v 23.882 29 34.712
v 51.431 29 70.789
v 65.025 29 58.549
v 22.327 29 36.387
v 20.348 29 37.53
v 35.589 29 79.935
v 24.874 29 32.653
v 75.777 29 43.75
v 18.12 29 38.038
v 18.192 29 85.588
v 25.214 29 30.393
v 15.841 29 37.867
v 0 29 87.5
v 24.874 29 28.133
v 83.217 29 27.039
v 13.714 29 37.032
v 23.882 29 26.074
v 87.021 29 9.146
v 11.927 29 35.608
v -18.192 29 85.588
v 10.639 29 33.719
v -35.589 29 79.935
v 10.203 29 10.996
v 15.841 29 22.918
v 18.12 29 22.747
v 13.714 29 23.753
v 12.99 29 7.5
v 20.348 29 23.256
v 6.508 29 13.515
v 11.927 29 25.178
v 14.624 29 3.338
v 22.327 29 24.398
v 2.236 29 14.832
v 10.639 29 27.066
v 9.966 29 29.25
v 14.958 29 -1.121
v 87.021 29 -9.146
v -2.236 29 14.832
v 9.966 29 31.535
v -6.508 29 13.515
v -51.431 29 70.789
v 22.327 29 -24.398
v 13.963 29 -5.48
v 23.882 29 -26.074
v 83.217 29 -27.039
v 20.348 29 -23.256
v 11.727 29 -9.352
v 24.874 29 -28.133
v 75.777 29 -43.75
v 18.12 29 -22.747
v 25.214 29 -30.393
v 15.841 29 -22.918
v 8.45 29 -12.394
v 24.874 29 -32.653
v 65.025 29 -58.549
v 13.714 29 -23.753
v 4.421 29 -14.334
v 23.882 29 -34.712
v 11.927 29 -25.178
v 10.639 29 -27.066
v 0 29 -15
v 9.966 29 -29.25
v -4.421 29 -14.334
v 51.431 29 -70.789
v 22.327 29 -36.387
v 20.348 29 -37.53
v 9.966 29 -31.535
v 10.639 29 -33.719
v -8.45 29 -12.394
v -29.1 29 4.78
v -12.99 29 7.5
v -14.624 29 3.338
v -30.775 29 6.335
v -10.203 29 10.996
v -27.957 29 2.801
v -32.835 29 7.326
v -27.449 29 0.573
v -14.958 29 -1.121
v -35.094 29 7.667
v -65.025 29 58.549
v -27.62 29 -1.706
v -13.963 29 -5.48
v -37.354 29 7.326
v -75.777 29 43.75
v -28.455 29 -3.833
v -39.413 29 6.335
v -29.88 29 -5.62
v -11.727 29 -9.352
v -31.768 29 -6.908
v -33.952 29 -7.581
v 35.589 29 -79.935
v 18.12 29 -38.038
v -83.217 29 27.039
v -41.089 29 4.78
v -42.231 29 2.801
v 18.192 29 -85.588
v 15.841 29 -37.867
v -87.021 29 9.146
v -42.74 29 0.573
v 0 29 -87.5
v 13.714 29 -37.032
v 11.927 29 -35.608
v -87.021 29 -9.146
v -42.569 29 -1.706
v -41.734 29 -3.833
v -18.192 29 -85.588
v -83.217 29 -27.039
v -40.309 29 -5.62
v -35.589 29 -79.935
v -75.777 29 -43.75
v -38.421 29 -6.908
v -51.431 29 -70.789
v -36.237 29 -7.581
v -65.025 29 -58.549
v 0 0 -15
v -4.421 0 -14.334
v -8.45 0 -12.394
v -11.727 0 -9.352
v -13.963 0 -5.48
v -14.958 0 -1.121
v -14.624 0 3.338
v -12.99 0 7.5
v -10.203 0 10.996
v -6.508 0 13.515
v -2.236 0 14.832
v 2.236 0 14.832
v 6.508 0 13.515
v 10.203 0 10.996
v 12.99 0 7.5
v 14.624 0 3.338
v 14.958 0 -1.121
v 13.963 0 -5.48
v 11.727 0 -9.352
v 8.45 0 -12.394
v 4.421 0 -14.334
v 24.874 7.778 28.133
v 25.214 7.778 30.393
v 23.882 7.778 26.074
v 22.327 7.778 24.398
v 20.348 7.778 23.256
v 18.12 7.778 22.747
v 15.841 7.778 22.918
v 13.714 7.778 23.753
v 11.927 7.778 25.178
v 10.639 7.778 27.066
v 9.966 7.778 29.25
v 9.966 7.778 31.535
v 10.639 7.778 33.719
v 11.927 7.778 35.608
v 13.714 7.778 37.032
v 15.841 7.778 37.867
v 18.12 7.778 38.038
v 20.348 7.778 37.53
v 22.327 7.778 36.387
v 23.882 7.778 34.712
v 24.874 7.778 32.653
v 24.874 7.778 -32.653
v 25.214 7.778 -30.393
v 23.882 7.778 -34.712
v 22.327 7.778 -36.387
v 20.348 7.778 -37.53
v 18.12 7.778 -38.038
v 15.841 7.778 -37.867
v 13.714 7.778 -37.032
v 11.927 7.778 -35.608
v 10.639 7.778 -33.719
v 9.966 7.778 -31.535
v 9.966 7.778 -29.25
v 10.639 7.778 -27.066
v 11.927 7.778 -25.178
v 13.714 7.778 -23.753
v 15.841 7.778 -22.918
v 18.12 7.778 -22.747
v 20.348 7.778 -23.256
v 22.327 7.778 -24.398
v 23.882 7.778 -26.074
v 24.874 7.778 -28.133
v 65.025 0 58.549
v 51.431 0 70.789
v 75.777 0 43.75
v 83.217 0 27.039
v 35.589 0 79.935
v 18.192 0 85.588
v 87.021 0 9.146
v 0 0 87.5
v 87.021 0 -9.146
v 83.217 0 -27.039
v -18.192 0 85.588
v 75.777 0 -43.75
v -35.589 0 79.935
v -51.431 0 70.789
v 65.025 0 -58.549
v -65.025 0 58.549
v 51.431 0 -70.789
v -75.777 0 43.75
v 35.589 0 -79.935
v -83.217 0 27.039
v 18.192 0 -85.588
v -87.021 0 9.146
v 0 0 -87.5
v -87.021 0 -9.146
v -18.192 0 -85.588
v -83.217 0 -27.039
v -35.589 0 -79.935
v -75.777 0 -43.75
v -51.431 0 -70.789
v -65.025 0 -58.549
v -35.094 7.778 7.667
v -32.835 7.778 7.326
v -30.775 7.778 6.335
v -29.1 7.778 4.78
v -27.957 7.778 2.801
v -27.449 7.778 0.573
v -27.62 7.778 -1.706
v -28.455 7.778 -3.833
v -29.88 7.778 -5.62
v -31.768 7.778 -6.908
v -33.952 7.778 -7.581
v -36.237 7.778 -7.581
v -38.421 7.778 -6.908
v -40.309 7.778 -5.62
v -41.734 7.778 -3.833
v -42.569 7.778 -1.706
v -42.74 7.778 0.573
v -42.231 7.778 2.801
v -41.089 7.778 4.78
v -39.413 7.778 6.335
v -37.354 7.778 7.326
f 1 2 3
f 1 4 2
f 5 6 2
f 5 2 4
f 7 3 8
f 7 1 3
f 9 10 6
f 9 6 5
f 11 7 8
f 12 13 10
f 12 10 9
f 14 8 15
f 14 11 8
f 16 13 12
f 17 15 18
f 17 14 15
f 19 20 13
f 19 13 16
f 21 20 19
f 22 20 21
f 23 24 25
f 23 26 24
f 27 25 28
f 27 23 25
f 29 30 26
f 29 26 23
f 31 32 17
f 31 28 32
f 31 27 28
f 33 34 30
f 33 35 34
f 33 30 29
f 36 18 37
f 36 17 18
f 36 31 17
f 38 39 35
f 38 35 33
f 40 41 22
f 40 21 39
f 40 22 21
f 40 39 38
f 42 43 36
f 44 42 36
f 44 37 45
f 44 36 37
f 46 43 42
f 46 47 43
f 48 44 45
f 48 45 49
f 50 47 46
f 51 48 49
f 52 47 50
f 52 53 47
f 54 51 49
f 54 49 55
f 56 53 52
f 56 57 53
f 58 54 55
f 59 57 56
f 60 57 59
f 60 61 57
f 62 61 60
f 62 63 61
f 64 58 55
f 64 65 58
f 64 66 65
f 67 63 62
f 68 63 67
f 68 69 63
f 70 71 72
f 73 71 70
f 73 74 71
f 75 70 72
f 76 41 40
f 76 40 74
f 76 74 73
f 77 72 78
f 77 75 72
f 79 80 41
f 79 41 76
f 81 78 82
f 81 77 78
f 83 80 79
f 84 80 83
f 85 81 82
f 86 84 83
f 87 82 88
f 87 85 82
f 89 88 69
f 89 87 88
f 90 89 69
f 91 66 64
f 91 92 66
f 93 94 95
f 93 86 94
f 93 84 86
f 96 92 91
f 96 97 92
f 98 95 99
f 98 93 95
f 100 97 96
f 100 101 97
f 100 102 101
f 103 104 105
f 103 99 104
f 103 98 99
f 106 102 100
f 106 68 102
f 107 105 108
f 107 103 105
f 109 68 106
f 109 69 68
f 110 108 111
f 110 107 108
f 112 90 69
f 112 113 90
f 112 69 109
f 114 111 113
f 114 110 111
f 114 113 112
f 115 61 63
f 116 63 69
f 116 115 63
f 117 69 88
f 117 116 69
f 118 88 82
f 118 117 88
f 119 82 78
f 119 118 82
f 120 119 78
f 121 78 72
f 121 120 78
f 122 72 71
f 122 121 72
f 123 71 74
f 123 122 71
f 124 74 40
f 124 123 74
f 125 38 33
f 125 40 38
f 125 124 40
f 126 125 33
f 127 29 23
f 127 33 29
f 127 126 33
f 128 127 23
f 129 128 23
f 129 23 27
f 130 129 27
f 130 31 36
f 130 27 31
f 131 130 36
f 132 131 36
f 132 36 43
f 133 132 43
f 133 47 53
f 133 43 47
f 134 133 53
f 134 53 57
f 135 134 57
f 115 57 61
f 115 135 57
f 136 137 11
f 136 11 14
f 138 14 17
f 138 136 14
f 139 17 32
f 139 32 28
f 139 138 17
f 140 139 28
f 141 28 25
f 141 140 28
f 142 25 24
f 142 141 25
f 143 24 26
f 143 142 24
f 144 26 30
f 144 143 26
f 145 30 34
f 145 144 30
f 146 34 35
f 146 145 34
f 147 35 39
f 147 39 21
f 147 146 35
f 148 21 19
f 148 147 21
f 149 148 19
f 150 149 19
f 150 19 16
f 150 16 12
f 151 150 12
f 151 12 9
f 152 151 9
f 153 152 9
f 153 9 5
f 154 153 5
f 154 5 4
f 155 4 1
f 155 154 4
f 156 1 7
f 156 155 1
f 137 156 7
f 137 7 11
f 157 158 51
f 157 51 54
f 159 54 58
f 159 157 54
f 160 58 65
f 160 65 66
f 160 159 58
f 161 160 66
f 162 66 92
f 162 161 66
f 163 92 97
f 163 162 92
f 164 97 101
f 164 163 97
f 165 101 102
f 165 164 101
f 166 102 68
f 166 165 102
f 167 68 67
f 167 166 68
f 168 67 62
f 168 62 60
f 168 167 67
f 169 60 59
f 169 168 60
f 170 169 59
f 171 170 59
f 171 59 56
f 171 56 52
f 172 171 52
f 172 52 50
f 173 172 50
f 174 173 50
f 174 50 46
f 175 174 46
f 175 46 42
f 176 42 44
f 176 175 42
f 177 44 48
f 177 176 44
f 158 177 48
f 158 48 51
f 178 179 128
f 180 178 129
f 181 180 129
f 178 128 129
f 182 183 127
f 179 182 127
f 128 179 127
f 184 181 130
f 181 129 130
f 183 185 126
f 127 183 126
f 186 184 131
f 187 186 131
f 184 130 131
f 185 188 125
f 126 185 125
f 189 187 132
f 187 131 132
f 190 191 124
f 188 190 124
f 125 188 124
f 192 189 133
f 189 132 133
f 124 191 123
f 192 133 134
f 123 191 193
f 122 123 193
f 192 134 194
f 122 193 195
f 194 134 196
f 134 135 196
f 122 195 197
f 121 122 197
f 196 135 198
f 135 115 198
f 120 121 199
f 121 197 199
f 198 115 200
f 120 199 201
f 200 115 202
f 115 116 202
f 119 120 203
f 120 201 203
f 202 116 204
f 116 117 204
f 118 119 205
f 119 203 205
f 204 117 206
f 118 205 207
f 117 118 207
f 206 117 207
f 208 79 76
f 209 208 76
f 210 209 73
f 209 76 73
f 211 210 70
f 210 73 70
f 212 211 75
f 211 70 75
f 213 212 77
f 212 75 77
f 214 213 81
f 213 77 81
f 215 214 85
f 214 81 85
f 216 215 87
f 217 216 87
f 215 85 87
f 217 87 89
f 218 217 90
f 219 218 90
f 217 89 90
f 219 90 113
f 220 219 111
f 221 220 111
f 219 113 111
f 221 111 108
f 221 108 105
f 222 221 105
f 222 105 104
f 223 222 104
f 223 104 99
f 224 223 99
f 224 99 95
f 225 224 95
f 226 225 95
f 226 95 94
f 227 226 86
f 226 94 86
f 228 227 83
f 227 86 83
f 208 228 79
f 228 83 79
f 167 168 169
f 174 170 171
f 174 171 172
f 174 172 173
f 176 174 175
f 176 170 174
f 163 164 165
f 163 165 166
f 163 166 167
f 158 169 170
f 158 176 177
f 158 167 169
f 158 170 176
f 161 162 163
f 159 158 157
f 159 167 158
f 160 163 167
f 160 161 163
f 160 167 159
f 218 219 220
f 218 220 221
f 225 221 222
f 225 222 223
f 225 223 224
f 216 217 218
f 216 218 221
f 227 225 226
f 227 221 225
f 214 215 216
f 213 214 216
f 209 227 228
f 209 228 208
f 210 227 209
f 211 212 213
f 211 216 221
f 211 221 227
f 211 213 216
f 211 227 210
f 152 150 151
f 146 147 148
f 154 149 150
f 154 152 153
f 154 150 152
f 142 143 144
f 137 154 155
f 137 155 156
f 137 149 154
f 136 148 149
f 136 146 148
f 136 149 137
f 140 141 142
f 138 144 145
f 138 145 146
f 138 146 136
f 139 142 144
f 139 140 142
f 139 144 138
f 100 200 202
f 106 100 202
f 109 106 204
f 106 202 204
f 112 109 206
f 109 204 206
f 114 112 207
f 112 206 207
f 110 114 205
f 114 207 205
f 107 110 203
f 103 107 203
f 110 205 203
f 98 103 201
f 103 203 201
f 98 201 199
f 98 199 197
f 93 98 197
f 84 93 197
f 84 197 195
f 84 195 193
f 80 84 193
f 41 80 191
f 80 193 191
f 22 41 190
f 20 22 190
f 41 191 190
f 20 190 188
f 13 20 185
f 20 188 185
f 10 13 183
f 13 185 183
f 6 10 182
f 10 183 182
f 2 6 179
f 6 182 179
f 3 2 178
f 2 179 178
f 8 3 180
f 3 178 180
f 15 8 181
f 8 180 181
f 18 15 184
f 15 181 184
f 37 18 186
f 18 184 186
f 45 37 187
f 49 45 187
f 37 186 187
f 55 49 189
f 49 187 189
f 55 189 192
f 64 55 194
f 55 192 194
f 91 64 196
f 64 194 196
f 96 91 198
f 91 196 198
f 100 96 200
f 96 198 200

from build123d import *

# Parameters (mm, degrees)
SKETCH1_R           = 87.5
BOSS_EXTRUDE1_DEPTH = 29
SKETCH2_R           = 15
CUT_EXTRUDE1_DEPTH  = 128.096420091
SKETCH3_R           = 7.666988893
CUT_EXTRUDE2_DEPTH  = 21.221624825
CIRPATTERN1_COUNT   = 3


with BuildPart() as part:
    # Sketch1 → Boss-Extrude1 (new body)
    with BuildSketch(Plane(origin=(0, 0, 0), x_dir=(1, 0, 0), z_dir=(0, 1, 0))):
        Circle(SKETCH1_R)
    extrude(amount=BOSS_EXTRUDE1_DEPTH)

    # Sketch2 → Cut-Extrude1 (cut, through all)
    with BuildSketch(Plane(origin=(0, 0, 0), x_dir=(1, 0, 0), z_dir=(0, 1, 0))):
        Circle(SKETCH2_R)
    extrude(amount=CUT_EXTRUDE1_DEPTH, mode=Mode.SUBTRACT)

    # Sketch3 → Cut-Extrude2 (cut)
    with BuildSketch(Plane(origin=(0, 29, 0), x_dir=(1, 0, 0), z_dir=(0, 1, 0))):
        with Locations((-35.094392614, 0)):
            Circle(SKETCH3_R)
    cut_extrude2 = extrude(amount=-CUT_EXTRUDE2_DEPTH, mode=Mode.SUBTRACT)

    # CirPattern1: Cut-Extrude2 ×3 about axis
    cirpattern1_axis = Axis((0, 0, 0), (0, 1, 0))
    for i in range(1, CIRPATTERN1_COUNT):
        add(cut_extrude2.rotate(cirpattern1_axis, i * 360 / CIRPATTERN1_COUNT), mode=Mode.SUBTRACT)


solid = part.part
